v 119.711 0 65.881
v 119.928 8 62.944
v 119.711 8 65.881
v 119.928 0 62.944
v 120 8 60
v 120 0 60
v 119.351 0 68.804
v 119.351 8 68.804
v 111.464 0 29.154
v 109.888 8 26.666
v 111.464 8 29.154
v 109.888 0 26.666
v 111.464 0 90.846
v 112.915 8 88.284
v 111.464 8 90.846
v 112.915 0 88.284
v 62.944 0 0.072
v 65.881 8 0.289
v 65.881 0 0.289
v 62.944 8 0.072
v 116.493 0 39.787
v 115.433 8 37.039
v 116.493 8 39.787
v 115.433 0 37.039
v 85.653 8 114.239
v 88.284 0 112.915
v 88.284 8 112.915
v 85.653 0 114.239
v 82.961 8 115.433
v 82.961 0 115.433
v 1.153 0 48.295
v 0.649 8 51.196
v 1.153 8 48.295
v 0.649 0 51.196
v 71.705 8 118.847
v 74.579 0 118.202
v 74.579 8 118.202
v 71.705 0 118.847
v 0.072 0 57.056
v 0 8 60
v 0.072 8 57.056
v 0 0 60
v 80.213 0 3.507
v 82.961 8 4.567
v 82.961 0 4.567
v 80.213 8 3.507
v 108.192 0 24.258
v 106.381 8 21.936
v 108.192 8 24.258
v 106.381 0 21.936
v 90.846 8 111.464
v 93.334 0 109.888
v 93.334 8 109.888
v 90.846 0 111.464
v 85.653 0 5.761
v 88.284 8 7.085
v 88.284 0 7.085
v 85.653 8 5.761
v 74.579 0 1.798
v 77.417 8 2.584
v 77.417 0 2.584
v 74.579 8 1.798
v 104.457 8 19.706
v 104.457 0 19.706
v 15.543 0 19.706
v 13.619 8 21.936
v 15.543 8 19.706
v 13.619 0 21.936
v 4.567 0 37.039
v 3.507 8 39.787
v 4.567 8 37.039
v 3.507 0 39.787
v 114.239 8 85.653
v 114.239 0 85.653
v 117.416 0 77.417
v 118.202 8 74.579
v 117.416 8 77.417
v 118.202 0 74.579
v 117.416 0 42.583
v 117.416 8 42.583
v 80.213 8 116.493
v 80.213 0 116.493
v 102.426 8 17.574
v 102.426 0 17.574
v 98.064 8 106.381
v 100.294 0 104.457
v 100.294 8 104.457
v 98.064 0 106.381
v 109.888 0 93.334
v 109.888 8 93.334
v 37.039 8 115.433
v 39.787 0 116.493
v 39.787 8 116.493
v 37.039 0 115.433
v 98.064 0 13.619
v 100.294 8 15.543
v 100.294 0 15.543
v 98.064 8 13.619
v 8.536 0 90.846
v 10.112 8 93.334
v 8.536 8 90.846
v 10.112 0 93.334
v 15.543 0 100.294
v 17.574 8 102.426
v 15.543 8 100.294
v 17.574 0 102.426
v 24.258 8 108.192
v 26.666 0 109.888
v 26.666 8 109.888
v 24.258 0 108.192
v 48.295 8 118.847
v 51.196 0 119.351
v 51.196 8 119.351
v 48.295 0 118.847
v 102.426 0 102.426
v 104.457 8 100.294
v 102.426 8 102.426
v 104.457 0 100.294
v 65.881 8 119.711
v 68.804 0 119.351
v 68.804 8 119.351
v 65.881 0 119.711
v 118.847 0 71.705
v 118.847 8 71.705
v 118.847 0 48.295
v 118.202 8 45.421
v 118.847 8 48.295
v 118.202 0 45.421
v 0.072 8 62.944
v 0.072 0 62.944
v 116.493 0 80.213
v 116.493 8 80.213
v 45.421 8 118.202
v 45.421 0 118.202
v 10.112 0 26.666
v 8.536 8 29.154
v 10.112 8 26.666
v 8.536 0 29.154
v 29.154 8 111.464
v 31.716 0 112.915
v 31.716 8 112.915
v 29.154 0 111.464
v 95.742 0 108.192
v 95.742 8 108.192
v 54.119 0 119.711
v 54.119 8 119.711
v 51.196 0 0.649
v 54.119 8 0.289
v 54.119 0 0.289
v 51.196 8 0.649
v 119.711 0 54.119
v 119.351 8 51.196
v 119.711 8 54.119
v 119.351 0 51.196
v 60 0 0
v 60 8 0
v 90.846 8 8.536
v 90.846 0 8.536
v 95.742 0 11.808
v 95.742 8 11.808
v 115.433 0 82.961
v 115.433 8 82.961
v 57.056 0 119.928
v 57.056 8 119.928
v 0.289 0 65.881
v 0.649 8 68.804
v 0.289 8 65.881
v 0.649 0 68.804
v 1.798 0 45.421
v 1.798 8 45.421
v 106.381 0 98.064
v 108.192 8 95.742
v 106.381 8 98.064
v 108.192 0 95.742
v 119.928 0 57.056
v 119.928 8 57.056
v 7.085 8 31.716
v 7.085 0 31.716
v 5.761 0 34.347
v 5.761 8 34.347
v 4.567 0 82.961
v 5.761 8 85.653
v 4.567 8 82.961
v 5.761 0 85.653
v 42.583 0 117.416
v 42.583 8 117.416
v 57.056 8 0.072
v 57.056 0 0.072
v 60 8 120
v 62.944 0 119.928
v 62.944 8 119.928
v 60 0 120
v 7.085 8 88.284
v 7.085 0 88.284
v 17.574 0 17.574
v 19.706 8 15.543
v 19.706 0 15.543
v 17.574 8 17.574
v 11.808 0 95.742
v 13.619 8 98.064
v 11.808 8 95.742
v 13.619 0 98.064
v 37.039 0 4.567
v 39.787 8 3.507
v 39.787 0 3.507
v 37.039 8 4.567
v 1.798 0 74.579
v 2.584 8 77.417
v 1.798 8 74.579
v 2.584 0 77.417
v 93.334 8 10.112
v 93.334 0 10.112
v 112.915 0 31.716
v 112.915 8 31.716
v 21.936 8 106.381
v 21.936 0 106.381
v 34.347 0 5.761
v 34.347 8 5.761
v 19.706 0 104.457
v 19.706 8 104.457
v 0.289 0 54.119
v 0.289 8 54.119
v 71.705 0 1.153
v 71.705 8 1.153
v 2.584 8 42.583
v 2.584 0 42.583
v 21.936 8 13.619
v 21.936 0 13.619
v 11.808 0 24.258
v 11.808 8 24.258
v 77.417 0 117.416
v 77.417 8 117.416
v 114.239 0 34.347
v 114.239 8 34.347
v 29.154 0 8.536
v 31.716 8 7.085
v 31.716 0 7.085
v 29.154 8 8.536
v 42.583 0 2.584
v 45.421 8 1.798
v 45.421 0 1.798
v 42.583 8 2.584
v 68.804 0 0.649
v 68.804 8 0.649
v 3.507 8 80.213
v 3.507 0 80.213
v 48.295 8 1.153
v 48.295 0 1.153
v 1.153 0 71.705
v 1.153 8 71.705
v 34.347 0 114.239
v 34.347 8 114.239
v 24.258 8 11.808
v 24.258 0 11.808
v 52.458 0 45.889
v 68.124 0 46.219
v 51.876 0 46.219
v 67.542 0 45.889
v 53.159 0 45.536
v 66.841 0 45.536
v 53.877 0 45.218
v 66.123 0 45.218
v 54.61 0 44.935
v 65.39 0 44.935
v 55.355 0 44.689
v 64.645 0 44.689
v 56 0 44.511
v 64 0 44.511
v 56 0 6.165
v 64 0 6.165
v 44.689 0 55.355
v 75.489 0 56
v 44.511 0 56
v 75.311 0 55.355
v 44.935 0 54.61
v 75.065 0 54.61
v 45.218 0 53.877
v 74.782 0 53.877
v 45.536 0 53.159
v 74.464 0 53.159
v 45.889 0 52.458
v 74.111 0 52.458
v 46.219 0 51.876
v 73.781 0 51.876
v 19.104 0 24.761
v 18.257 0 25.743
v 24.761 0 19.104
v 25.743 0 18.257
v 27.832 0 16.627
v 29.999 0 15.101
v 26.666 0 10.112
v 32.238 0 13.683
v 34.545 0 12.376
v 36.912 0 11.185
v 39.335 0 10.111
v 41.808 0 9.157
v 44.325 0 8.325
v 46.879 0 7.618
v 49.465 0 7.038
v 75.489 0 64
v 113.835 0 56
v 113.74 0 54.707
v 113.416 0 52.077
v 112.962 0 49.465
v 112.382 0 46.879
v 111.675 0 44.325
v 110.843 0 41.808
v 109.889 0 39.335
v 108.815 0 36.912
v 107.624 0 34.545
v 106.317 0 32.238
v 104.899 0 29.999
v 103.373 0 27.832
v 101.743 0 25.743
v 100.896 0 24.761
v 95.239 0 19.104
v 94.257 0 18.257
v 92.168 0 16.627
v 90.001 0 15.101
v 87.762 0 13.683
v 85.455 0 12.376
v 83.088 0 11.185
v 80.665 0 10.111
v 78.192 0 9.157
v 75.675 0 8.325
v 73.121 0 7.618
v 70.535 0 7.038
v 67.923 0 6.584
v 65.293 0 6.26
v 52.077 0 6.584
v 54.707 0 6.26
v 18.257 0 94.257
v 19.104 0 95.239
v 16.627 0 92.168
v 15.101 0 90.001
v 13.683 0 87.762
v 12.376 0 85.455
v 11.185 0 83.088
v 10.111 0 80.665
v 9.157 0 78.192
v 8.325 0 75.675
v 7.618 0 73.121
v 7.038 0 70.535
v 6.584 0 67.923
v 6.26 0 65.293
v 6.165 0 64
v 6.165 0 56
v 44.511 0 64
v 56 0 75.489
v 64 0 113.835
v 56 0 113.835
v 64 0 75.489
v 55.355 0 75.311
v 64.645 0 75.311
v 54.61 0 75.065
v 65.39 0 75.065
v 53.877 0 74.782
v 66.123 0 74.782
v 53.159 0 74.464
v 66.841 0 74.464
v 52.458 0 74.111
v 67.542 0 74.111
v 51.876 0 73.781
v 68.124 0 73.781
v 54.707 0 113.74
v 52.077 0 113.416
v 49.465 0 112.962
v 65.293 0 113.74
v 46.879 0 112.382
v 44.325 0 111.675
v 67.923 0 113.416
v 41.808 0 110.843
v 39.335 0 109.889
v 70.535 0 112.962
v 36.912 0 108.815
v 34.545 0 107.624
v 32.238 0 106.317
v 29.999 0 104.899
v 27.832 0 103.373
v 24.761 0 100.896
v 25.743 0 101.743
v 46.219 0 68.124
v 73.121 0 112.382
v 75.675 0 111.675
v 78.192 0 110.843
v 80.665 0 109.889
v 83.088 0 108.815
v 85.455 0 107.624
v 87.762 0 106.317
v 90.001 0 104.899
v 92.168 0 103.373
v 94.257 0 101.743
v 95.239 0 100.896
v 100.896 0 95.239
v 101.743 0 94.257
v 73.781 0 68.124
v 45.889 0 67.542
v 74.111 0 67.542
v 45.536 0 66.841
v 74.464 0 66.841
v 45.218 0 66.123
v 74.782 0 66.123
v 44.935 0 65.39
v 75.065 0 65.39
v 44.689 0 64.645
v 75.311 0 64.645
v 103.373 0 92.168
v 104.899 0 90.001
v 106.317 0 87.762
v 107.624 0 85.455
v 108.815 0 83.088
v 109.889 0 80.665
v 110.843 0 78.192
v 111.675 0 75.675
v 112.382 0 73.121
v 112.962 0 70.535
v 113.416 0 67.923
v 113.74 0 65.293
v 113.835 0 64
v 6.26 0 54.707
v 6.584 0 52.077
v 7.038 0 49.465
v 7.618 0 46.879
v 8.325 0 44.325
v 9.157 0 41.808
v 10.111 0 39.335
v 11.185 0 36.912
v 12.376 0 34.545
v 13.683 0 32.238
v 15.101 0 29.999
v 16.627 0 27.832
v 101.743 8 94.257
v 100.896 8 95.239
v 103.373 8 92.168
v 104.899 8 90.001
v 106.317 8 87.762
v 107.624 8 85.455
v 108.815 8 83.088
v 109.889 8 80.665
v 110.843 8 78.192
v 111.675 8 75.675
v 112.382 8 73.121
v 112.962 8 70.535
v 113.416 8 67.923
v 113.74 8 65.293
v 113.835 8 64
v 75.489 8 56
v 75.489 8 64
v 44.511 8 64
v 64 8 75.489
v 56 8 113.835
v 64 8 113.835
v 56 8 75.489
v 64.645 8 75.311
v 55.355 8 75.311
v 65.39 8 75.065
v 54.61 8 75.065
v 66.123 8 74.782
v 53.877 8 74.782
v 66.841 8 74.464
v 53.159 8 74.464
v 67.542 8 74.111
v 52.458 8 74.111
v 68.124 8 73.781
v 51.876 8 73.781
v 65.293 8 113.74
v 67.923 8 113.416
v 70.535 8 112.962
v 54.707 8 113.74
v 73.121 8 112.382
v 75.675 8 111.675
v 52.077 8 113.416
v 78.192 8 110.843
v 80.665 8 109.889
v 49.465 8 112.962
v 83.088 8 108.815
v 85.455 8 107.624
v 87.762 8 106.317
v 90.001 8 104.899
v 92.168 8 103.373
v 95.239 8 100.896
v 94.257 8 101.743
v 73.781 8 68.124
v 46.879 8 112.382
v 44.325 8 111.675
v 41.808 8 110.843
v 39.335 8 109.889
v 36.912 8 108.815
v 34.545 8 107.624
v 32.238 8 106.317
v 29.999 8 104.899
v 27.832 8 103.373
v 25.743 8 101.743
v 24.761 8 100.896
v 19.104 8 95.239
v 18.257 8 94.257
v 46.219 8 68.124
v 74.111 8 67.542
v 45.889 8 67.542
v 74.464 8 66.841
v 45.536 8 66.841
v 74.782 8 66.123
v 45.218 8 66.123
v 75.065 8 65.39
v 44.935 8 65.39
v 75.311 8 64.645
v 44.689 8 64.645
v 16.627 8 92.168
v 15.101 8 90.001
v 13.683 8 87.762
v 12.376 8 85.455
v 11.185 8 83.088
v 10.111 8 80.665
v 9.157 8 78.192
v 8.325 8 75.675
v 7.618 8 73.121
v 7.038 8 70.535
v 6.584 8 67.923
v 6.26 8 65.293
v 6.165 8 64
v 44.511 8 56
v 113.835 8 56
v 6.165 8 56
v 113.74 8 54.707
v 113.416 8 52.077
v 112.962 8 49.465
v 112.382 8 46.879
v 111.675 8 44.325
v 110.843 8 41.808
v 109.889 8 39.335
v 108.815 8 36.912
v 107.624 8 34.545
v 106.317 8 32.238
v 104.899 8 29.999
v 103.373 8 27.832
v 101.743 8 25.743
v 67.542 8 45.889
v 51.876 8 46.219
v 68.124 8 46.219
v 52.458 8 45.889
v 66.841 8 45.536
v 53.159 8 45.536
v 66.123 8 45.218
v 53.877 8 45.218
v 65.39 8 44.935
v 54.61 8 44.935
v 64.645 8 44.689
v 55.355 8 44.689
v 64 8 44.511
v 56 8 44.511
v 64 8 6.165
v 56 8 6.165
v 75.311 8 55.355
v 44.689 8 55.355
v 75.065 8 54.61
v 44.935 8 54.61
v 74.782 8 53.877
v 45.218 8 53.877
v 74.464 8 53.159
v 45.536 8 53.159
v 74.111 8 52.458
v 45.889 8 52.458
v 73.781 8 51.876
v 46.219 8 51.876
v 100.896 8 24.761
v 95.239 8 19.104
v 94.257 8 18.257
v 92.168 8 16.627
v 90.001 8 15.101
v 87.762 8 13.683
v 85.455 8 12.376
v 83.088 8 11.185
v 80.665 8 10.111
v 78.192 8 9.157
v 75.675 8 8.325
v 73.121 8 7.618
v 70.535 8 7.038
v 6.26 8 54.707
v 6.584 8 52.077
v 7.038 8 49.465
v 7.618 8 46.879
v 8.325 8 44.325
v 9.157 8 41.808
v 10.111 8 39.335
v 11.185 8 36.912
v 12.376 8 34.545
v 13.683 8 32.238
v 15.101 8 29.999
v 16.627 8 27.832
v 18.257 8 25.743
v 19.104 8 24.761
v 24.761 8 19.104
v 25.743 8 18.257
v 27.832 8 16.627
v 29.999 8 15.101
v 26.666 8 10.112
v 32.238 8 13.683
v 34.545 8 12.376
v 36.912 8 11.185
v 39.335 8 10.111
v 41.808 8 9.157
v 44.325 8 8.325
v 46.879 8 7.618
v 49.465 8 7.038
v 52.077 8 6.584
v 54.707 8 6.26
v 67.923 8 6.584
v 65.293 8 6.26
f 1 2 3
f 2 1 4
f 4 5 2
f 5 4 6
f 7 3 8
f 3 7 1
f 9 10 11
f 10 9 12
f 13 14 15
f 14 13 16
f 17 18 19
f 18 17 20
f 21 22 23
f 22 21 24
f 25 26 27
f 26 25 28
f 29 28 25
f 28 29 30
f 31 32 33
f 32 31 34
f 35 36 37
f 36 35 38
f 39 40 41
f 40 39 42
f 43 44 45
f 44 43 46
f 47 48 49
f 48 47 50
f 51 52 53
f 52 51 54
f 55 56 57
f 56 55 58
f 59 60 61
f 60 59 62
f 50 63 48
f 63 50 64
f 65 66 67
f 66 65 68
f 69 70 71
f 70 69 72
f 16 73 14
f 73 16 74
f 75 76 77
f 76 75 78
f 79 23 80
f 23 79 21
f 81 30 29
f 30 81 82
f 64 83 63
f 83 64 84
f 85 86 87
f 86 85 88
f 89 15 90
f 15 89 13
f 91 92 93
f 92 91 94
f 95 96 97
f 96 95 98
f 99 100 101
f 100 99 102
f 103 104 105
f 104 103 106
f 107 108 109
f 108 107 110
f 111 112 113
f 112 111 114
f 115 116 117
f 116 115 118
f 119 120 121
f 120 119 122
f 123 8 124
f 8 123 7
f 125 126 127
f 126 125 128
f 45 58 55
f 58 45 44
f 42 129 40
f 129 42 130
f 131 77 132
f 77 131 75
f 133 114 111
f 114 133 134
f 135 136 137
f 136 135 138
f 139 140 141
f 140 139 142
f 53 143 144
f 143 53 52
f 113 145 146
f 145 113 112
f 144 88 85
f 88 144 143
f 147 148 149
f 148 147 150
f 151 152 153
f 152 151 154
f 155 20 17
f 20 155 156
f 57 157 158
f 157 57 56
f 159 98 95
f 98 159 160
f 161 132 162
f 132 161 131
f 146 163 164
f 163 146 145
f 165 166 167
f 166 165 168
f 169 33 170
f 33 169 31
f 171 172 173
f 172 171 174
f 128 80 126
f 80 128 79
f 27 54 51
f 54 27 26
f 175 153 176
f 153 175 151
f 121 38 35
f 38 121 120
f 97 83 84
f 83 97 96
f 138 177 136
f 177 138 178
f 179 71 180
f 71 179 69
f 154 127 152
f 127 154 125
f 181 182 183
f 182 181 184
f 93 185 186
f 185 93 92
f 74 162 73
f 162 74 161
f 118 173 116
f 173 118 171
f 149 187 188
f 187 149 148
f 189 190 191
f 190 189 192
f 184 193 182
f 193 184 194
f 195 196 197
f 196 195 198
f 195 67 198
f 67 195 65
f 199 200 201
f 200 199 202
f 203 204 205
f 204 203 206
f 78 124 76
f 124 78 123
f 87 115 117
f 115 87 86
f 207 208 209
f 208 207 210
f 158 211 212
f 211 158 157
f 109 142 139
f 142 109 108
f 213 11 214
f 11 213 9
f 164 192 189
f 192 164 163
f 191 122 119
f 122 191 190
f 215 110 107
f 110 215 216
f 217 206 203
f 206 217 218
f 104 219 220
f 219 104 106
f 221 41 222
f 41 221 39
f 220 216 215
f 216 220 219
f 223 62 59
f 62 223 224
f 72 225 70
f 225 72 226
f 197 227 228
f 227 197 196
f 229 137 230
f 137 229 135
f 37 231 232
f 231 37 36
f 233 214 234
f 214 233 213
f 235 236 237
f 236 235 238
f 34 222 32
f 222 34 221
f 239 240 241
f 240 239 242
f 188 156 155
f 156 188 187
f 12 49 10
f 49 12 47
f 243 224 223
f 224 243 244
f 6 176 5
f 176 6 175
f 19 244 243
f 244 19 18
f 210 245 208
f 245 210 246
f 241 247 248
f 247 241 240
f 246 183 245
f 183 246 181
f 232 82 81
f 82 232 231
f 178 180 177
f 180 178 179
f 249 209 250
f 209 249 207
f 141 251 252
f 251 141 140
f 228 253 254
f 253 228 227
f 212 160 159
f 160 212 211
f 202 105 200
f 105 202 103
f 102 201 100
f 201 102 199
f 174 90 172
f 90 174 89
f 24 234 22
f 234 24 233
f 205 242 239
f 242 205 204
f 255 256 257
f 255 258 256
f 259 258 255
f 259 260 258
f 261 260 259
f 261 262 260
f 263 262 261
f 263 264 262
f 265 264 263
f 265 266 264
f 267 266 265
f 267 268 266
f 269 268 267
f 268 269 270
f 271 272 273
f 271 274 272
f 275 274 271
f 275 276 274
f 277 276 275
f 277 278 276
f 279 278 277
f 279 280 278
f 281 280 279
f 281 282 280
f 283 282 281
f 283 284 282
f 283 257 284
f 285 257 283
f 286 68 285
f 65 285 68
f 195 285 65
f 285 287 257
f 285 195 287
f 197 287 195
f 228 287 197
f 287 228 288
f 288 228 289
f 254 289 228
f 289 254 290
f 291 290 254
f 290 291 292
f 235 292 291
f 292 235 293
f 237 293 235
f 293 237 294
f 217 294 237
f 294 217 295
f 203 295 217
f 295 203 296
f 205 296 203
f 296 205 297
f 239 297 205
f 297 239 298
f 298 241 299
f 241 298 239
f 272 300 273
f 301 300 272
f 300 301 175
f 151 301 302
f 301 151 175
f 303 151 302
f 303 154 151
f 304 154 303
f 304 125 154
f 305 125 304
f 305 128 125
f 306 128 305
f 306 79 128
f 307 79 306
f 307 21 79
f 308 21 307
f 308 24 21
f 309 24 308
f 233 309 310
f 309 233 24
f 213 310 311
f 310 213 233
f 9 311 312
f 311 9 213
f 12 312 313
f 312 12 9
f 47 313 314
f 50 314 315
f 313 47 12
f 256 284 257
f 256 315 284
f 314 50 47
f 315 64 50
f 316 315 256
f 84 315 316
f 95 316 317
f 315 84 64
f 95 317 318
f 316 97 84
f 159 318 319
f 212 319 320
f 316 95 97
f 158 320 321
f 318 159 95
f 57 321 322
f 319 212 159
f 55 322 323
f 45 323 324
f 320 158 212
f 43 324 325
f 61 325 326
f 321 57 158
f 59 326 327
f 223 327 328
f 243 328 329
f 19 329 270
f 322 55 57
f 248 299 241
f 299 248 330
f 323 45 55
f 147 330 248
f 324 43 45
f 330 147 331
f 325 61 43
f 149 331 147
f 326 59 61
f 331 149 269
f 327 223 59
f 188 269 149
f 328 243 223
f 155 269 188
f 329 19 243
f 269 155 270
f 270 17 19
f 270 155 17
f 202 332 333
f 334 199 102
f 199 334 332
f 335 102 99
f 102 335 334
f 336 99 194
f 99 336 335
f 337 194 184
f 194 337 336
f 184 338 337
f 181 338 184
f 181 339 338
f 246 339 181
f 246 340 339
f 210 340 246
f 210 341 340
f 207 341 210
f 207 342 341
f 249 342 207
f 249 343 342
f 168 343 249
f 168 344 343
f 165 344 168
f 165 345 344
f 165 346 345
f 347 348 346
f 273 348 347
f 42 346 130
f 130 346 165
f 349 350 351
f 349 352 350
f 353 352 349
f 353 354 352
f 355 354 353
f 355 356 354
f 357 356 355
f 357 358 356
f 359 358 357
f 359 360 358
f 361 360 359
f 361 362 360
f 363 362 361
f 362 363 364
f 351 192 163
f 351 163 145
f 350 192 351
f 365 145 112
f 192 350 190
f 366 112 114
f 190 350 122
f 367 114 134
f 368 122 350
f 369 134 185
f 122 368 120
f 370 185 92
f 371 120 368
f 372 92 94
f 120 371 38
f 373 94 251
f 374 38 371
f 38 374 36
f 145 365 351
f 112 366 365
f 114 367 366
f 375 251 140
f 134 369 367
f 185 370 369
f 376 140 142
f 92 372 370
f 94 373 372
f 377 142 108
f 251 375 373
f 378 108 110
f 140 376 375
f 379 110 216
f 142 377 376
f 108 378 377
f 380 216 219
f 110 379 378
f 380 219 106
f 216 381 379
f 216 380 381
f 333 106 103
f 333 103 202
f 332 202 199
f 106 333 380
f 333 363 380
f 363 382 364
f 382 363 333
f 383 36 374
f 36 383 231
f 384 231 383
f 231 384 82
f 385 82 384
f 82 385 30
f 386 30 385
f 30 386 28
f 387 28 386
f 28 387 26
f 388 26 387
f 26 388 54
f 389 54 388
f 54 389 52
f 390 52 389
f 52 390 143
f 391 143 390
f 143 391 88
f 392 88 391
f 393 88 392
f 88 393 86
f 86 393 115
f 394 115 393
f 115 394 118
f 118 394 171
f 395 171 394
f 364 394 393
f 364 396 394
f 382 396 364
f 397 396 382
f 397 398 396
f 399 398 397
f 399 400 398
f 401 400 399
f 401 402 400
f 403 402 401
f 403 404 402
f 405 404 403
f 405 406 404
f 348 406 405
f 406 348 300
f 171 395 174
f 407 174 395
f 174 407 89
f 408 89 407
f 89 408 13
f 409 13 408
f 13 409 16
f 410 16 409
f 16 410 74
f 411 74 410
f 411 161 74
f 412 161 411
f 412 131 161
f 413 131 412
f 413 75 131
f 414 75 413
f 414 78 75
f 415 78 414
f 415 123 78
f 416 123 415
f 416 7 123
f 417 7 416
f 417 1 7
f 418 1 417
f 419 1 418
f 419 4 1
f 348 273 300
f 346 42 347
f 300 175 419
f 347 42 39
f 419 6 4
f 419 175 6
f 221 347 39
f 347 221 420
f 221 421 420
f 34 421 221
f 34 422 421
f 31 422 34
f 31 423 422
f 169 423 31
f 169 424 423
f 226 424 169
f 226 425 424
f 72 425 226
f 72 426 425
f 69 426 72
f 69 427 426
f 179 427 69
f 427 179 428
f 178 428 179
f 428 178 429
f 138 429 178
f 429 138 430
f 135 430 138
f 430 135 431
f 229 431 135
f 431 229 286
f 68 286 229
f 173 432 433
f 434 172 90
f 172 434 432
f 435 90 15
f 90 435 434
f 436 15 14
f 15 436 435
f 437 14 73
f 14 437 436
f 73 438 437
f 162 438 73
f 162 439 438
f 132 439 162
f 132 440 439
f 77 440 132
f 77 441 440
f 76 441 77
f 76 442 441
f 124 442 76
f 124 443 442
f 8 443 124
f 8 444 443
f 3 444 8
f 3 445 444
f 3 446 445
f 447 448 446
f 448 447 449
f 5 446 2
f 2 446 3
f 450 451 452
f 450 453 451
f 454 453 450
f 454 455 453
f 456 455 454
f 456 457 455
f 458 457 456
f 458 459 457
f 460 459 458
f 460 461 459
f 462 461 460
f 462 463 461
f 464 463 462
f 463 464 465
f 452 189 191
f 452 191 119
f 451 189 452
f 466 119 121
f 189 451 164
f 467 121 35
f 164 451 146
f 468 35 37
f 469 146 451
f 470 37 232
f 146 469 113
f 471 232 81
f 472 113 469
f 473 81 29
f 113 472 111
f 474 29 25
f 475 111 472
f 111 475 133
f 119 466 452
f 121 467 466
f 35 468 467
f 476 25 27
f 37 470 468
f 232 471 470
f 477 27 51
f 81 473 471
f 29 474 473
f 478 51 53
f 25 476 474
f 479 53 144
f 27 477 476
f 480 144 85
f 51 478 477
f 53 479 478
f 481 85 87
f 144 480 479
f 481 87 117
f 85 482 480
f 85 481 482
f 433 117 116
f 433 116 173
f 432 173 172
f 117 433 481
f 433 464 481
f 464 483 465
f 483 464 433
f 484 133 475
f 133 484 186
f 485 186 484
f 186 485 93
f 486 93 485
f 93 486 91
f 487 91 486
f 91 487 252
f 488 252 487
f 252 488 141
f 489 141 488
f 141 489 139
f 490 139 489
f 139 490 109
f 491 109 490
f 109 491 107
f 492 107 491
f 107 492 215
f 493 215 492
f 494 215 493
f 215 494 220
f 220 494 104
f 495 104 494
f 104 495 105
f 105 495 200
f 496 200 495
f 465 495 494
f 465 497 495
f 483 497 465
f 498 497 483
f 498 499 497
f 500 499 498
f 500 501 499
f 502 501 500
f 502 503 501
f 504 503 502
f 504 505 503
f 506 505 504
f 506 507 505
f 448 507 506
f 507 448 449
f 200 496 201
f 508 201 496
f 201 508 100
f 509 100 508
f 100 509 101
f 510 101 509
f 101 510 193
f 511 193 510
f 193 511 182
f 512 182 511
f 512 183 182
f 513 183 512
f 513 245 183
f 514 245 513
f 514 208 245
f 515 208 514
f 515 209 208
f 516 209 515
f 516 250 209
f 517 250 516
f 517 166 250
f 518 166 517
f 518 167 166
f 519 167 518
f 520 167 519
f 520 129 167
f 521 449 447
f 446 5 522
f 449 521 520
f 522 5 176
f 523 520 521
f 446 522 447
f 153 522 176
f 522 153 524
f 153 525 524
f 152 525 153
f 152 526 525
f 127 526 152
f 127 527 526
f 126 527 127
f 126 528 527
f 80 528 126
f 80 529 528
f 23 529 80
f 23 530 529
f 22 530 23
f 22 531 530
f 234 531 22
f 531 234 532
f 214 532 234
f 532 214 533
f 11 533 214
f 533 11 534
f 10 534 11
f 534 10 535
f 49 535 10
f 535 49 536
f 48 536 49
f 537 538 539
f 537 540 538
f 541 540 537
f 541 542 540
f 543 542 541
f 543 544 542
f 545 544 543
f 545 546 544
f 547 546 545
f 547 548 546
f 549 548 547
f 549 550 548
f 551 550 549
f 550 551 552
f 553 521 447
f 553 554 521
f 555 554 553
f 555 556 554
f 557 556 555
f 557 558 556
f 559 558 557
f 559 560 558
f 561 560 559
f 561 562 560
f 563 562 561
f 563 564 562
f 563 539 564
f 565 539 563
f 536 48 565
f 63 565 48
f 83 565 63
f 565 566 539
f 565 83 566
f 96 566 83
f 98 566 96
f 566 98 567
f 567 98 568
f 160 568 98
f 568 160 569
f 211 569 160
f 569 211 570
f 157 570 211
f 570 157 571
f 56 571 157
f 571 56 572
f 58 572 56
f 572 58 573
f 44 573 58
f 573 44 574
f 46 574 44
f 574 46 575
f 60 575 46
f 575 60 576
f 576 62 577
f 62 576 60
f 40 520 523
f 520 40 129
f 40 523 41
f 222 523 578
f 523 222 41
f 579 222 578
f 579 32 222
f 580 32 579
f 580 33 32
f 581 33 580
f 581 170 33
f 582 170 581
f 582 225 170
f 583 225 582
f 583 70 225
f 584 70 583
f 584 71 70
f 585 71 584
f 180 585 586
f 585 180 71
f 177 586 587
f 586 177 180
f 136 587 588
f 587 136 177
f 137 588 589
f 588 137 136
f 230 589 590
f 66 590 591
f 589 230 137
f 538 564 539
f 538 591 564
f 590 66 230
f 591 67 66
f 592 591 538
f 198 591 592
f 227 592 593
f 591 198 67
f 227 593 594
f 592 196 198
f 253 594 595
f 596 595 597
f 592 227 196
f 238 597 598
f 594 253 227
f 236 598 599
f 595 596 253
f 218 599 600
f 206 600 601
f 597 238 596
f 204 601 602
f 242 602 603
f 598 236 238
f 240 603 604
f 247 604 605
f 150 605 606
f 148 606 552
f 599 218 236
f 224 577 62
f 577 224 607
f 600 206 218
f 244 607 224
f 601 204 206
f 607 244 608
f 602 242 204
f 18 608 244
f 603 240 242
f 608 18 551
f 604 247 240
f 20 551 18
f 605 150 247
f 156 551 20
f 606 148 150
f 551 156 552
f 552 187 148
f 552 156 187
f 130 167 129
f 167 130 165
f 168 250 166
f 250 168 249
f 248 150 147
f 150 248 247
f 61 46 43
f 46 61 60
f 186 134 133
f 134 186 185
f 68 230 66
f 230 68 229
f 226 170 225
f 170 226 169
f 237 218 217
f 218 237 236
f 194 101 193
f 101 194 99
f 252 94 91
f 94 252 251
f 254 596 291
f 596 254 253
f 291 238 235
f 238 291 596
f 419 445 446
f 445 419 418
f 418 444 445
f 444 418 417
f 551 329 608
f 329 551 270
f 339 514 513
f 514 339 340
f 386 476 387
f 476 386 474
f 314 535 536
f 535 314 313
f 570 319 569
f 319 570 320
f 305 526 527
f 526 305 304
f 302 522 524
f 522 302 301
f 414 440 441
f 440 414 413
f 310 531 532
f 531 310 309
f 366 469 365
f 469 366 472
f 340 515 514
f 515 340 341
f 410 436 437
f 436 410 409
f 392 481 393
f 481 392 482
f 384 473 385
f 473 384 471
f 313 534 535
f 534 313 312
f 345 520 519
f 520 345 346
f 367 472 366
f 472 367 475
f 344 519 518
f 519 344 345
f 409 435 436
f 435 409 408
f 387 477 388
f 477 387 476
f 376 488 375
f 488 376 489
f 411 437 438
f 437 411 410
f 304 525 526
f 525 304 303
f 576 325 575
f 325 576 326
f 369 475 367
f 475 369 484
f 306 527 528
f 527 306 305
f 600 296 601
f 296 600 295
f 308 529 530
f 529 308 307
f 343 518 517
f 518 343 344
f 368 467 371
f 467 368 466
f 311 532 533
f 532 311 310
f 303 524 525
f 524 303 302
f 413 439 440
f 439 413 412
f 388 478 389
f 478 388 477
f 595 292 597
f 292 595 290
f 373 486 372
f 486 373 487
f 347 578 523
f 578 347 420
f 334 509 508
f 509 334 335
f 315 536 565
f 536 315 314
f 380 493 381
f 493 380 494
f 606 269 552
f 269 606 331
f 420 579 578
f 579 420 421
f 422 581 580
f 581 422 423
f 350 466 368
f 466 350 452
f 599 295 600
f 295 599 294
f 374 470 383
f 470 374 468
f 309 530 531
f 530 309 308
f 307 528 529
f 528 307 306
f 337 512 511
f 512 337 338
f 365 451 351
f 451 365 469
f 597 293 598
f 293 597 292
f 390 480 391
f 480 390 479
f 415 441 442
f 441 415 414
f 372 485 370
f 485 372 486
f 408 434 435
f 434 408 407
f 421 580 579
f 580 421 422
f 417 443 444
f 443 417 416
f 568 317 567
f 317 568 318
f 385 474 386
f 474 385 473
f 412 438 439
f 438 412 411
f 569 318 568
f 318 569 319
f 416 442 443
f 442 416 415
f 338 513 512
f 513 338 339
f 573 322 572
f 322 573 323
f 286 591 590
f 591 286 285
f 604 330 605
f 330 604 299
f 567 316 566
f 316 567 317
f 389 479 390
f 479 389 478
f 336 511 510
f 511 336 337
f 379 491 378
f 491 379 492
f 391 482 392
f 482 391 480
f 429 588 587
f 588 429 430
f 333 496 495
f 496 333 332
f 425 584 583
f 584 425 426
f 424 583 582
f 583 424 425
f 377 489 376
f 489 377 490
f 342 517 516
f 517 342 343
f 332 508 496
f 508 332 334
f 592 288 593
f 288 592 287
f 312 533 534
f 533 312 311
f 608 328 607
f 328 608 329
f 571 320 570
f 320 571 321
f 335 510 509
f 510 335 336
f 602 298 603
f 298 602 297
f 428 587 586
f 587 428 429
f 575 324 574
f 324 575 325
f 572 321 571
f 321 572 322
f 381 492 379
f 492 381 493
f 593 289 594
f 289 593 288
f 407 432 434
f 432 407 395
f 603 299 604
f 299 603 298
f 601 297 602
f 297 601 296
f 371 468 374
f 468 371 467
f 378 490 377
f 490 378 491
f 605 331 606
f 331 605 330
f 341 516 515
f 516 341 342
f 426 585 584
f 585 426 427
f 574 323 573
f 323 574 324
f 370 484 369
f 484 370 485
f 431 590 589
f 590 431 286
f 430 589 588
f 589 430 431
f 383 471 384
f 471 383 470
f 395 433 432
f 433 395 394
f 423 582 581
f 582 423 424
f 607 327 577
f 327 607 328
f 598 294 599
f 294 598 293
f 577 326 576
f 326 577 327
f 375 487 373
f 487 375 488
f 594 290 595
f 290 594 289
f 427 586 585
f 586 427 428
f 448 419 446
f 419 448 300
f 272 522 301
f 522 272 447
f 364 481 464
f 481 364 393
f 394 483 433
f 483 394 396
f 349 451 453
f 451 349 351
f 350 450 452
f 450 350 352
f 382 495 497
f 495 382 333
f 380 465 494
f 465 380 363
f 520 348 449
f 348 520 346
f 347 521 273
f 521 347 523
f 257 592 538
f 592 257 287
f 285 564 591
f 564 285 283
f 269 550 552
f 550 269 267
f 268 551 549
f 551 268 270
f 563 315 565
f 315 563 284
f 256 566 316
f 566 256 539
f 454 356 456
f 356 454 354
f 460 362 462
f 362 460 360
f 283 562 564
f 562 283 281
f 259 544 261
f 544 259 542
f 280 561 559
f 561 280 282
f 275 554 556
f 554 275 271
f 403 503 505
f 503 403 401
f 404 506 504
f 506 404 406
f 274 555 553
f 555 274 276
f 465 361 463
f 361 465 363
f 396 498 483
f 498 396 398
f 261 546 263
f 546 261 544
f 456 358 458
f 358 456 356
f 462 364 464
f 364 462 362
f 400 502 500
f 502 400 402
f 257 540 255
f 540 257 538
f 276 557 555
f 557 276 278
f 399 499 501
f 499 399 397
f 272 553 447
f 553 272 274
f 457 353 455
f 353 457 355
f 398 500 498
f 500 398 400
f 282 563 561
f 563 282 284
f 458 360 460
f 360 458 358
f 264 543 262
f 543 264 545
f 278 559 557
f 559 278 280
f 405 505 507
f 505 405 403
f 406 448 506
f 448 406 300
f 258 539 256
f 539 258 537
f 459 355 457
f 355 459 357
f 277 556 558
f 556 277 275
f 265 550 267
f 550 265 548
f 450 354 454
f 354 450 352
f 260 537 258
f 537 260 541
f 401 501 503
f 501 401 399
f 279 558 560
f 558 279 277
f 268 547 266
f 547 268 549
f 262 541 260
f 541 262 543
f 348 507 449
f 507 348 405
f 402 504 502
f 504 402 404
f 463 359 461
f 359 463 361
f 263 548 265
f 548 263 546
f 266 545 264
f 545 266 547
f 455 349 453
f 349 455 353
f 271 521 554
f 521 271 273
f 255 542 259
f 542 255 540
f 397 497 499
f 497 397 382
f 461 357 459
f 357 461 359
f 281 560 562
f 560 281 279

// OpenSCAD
$fn=128;
// Wheel lies in XZ. Spokes overlap the hub and rim by 1 mm.
translate([60,8,60]) rotate([90,0,0]) union(){
difference(){cylinder(d=120,h=8);translate([0,0,-1])cylinder(d=108,h=10);}
cylinder(d=32,h=8);
for(a=[0:45:315])rotate([0,0,a])translate([15,-4,0])cube([40,8,8]);}
